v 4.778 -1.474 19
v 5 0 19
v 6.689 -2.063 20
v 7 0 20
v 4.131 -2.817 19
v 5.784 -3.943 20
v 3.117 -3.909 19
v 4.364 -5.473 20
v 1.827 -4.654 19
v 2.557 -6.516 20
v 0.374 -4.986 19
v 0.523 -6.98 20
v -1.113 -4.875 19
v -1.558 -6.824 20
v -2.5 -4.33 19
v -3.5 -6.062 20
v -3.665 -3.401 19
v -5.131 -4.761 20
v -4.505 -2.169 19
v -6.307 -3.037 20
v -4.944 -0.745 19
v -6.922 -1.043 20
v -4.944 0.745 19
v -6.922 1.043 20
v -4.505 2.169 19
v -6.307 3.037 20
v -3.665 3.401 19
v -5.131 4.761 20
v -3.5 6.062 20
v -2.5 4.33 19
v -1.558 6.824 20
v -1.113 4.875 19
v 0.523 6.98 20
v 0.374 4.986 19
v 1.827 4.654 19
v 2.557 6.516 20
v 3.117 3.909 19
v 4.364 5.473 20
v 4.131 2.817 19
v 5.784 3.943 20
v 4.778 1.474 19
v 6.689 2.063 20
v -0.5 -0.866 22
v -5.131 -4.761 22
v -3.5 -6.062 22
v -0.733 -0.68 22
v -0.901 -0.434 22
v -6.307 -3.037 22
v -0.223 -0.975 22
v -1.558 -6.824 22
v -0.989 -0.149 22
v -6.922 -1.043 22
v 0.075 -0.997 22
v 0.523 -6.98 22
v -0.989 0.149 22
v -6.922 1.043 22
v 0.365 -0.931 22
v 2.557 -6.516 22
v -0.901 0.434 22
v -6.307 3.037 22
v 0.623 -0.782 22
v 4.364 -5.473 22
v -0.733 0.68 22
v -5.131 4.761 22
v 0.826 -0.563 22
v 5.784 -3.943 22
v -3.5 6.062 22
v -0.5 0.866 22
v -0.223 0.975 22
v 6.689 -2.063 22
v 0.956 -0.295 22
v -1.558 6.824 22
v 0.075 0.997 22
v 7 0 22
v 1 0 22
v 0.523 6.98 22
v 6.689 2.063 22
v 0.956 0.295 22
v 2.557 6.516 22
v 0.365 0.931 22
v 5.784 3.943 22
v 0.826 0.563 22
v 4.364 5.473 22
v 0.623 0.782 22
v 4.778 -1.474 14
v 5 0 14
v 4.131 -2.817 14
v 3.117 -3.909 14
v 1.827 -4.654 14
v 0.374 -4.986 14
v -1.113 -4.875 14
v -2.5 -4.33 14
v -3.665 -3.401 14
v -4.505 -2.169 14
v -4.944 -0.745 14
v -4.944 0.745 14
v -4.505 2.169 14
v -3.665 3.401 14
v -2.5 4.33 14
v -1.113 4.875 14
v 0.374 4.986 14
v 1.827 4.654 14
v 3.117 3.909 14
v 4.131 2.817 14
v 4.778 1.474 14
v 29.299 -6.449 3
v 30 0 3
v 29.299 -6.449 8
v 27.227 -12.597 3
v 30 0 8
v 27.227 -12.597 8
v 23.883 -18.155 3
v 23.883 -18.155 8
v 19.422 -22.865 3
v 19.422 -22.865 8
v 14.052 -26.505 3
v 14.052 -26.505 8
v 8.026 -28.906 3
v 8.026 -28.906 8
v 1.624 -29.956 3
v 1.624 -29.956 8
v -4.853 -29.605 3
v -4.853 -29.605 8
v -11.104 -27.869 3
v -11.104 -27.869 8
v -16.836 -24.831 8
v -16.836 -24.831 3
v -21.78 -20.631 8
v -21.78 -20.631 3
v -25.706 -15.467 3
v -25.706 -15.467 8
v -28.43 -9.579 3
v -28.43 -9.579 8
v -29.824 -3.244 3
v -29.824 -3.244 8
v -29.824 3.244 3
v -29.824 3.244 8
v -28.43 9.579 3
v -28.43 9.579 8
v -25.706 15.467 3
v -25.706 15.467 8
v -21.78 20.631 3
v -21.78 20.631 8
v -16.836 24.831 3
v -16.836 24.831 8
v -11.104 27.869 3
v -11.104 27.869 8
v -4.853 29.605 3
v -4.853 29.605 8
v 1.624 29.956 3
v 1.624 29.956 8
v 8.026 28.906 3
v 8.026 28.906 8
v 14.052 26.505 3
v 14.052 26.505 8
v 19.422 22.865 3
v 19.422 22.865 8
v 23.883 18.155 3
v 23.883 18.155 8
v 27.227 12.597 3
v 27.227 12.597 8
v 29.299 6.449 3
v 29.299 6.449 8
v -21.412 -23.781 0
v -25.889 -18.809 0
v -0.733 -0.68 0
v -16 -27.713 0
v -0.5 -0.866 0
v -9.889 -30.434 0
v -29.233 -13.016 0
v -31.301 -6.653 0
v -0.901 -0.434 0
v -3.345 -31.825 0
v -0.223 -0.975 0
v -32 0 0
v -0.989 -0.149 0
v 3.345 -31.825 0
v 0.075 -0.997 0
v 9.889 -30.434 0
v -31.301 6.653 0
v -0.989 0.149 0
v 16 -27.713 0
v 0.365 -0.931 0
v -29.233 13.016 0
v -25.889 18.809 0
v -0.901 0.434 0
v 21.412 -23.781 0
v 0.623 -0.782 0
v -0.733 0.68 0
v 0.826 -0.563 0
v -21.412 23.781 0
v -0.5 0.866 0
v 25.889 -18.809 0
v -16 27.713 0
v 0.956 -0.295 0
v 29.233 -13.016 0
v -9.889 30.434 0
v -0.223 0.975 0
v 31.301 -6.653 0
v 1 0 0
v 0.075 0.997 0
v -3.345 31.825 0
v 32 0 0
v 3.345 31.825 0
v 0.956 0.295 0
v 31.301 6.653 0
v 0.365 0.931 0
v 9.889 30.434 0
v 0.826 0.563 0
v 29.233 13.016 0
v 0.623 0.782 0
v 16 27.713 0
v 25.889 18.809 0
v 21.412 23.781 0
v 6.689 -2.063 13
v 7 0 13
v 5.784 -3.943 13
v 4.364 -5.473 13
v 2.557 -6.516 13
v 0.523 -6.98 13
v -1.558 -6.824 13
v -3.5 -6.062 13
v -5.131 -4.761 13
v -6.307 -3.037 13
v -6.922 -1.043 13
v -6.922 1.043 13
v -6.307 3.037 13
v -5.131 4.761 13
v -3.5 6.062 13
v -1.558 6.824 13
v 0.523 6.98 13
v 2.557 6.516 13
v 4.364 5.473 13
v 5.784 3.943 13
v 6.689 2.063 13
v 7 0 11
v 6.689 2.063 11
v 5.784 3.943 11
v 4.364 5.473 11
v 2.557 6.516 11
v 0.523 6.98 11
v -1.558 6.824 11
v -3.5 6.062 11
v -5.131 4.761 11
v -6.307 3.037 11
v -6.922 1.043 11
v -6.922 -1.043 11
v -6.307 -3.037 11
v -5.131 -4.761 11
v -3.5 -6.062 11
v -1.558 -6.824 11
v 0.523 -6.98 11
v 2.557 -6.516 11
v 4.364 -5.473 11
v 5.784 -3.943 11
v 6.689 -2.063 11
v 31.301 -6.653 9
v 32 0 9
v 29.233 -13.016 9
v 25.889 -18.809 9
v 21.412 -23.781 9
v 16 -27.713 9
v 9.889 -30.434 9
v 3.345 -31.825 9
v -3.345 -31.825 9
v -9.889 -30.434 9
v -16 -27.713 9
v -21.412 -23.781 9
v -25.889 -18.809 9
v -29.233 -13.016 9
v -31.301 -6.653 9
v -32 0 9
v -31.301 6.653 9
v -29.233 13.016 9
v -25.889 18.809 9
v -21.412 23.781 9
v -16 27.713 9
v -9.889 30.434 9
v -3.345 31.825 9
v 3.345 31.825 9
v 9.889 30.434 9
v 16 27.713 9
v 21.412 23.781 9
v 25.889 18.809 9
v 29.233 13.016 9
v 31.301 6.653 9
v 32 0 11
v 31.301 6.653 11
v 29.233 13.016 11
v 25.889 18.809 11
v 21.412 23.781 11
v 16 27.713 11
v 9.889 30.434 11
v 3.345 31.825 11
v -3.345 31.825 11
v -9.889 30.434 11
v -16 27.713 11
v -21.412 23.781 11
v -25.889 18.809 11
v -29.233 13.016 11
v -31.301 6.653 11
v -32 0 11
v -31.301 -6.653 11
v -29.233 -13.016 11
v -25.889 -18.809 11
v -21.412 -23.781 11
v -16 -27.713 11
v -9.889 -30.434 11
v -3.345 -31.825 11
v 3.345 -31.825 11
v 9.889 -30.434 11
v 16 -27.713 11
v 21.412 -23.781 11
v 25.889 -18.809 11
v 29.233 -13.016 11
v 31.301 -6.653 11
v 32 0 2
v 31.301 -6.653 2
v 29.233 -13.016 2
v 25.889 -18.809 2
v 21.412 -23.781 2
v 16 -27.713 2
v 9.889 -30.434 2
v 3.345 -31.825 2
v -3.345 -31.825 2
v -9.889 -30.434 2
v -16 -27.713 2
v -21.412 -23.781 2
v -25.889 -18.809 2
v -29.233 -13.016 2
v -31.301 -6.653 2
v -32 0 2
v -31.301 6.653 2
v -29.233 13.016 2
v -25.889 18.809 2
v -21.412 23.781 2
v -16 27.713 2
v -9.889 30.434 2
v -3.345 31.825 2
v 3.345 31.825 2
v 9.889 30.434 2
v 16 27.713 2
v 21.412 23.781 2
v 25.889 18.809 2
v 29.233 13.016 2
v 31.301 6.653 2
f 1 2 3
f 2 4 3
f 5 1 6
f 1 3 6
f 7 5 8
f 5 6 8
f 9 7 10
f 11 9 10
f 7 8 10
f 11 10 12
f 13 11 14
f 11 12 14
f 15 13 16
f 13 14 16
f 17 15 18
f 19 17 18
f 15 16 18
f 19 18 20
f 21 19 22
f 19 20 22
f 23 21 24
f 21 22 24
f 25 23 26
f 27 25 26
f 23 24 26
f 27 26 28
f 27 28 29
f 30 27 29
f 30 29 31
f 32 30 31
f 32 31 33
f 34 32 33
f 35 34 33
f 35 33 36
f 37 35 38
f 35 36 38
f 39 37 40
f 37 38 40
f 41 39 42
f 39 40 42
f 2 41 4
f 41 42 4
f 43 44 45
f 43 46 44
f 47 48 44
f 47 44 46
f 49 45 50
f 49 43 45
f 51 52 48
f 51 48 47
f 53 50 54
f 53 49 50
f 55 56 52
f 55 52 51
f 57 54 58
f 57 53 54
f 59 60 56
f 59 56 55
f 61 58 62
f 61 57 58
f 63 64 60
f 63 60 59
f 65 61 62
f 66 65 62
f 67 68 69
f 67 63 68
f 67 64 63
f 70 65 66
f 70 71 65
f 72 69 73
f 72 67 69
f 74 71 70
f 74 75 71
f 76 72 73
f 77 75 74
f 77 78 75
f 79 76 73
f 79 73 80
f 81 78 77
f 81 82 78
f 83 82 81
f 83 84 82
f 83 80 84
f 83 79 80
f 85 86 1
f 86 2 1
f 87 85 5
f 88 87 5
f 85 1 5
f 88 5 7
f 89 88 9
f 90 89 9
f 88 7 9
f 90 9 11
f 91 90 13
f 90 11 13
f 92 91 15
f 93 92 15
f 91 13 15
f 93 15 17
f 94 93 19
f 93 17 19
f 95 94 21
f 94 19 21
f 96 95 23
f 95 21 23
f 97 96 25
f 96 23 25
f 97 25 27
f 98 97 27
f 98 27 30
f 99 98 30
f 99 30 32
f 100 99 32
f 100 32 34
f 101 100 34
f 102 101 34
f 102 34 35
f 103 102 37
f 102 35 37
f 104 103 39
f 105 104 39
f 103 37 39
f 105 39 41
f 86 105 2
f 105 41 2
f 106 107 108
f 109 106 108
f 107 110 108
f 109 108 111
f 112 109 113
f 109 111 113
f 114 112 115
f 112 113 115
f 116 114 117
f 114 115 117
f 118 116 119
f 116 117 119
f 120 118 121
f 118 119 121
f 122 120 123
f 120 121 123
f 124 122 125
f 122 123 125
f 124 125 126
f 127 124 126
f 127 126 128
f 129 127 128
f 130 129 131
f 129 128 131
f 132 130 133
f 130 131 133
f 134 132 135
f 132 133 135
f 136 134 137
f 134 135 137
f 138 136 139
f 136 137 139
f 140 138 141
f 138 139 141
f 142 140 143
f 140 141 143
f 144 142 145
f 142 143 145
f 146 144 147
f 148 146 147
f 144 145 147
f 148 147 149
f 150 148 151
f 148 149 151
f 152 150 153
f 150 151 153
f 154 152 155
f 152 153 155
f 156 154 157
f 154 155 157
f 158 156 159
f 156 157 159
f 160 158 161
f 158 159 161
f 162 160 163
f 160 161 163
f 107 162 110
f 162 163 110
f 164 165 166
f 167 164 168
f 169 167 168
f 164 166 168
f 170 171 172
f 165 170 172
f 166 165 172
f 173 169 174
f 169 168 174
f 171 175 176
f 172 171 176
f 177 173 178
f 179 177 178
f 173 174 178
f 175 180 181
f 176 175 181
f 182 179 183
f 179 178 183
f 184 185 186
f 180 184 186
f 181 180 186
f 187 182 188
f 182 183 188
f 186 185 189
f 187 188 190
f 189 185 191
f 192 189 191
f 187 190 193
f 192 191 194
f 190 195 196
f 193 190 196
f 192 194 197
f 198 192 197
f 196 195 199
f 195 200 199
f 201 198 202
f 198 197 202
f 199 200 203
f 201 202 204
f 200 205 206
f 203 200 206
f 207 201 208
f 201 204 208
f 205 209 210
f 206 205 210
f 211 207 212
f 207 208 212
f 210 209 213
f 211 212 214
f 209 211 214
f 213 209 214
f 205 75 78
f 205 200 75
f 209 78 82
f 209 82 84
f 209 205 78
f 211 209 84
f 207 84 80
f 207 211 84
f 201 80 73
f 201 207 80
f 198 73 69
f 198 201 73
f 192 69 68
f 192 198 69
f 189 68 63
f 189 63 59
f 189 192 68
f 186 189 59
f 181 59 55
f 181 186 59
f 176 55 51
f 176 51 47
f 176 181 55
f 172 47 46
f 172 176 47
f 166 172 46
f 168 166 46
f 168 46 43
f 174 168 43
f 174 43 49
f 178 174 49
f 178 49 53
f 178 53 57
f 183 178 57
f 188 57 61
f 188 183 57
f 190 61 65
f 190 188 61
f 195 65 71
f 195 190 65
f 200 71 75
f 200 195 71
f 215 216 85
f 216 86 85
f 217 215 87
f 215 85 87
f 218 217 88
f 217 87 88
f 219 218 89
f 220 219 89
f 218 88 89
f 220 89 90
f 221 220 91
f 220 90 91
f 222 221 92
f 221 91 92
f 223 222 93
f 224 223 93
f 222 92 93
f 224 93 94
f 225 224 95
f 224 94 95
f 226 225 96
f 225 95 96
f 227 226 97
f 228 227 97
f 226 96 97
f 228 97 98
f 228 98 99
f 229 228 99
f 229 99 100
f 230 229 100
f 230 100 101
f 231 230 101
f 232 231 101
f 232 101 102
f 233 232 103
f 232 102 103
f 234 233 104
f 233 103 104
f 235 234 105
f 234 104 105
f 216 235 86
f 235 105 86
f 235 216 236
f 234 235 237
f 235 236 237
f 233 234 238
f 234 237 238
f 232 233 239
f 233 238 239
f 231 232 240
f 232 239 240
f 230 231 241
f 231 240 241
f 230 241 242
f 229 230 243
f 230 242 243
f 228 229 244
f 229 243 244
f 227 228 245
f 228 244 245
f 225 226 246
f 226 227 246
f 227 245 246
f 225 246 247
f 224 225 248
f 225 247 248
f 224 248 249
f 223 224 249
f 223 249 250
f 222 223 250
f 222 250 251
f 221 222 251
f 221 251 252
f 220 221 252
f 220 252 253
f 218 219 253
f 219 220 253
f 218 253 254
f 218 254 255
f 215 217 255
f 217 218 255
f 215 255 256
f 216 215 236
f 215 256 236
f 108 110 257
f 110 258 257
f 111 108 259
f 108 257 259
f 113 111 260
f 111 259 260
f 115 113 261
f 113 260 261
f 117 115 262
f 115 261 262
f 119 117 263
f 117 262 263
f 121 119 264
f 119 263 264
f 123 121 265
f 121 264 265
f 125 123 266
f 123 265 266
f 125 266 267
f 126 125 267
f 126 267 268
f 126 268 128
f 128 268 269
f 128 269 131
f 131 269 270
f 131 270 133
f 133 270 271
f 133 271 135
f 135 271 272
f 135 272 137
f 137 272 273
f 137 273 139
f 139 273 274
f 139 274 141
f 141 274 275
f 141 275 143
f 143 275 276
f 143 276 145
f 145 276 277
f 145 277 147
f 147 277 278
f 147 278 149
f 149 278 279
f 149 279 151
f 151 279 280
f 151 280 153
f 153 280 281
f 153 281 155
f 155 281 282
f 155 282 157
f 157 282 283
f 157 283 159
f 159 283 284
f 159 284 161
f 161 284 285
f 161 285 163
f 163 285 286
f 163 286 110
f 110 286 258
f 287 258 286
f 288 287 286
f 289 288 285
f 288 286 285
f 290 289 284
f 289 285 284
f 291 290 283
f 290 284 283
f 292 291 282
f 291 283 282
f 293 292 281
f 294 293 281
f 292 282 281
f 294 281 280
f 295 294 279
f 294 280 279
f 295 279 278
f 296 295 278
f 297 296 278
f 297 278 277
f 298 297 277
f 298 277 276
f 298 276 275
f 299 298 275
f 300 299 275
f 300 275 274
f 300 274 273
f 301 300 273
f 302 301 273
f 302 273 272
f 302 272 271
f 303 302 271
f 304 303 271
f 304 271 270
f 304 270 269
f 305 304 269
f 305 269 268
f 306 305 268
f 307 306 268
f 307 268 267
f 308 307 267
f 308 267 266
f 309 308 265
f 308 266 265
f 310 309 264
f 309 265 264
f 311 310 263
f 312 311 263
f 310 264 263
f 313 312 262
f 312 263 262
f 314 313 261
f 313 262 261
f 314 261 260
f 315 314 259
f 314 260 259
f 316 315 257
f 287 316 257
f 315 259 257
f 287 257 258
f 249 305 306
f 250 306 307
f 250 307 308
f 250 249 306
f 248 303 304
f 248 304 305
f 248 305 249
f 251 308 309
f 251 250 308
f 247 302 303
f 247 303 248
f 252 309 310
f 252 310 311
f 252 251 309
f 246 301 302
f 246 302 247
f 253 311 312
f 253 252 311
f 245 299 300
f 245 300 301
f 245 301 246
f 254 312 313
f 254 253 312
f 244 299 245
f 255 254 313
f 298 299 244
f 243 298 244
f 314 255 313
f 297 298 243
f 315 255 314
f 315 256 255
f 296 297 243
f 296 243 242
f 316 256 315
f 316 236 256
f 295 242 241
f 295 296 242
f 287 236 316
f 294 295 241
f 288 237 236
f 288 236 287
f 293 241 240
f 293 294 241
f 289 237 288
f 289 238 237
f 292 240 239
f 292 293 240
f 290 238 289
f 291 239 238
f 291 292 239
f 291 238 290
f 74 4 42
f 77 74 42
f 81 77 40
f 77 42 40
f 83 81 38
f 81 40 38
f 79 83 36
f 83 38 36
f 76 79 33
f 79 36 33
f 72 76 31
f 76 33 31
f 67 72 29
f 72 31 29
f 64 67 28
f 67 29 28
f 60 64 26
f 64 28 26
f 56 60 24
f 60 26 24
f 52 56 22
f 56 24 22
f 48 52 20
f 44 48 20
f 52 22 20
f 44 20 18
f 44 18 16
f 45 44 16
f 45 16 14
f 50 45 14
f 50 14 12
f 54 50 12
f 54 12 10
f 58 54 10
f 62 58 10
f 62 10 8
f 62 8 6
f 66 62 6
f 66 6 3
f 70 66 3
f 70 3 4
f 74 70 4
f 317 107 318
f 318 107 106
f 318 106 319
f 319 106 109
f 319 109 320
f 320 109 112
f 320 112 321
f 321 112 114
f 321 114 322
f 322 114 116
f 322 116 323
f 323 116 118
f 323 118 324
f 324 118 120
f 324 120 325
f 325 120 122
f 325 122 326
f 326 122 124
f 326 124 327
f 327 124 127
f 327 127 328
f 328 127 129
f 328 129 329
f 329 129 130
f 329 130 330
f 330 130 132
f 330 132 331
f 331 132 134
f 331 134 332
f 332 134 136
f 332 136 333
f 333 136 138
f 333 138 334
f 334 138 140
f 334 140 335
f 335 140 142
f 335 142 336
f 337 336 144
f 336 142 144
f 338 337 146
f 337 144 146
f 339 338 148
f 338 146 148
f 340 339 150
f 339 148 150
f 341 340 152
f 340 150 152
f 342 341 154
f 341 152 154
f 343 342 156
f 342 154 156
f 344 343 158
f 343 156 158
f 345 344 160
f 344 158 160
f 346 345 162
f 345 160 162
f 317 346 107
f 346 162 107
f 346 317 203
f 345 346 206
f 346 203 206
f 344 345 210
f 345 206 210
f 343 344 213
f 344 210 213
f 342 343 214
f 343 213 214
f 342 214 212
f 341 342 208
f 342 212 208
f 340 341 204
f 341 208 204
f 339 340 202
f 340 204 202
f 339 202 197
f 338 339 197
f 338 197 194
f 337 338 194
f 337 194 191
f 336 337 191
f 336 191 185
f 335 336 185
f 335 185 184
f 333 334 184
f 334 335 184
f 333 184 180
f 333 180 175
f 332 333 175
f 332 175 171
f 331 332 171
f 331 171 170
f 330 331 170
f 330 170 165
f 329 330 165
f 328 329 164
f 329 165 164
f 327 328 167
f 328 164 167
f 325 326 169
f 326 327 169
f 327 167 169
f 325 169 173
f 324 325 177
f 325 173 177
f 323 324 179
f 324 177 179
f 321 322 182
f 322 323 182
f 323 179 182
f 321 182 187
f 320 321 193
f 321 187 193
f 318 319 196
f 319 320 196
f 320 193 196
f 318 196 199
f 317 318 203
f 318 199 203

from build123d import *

# Parameters (mm, degrees)
SKETCH1_R           = 32
SKETCH1_R_2         = 1
BOSS_EXTRUDE1_DEPTH = 11
SKETCH7_R           = 7
SKETCH7_R_2         = 1
BOSS_EXTRUDE3_DEPTH = 11


with BuildPart() as part:
    # Sketch1 → Boss-Extrude1 (new body)
    with BuildSketch(Plane.XY):
        Circle(SKETCH1_R)
        Circle(SKETCH1_R_2, mode=Mode.SUBTRACT)
    extrude(amount=BOSS_EXTRUDE1_DEPTH)

    # Sketch4 → Cut-Revolve1 (revolve, cut)
    with BuildSketch(Plane(origin=(0, 0, 0), x_dir=(0, 0, -1), z_dir=(1, 0, 0)), mode=Mode.PRIVATE) as cut_revolve1_sk:
        Polygon((-2, 32), (-3, 30), (-8, 30), (-9, 32), align=None)
    revolve(cut_revolve1_sk.sketch.rotate(Axis((0, 0, 1000), (0, 0, -1)), 90), axis=Axis((0, 0, 1000), (0, 0, -1)), mode=Mode.SUBTRACT)

    # Sketch7 → Boss-Extrude3 (add)
    with BuildSketch(Plane.XY.offset(11)):
        Circle(SKETCH7_R)
        Circle(SKETCH7_R_2, mode=Mode.SUBTRACT)
    extrude(amount=BOSS_EXTRUDE3_DEPTH)

    # Sketch8 → Cut-Revolve3 (revolve, cut)
    with BuildSketch(Plane(origin=(0, 0, 0), x_dir=(0, 0, -1), z_dir=(1, 0, 0)), mode=Mode.PRIVATE) as cut_revolve3_sk:
        Polygon((-20, 7), (-13, 7), (-14, 5), (-19, 5), align=None)
    revolve(cut_revolve3_sk.sketch.rotate(Axis((0, 0, 1000), (0, 0, -1)), 90), axis=Axis((0, 0, 1000), (0, 0, -1)), mode=Mode.SUBTRACT)


solid = part.part
